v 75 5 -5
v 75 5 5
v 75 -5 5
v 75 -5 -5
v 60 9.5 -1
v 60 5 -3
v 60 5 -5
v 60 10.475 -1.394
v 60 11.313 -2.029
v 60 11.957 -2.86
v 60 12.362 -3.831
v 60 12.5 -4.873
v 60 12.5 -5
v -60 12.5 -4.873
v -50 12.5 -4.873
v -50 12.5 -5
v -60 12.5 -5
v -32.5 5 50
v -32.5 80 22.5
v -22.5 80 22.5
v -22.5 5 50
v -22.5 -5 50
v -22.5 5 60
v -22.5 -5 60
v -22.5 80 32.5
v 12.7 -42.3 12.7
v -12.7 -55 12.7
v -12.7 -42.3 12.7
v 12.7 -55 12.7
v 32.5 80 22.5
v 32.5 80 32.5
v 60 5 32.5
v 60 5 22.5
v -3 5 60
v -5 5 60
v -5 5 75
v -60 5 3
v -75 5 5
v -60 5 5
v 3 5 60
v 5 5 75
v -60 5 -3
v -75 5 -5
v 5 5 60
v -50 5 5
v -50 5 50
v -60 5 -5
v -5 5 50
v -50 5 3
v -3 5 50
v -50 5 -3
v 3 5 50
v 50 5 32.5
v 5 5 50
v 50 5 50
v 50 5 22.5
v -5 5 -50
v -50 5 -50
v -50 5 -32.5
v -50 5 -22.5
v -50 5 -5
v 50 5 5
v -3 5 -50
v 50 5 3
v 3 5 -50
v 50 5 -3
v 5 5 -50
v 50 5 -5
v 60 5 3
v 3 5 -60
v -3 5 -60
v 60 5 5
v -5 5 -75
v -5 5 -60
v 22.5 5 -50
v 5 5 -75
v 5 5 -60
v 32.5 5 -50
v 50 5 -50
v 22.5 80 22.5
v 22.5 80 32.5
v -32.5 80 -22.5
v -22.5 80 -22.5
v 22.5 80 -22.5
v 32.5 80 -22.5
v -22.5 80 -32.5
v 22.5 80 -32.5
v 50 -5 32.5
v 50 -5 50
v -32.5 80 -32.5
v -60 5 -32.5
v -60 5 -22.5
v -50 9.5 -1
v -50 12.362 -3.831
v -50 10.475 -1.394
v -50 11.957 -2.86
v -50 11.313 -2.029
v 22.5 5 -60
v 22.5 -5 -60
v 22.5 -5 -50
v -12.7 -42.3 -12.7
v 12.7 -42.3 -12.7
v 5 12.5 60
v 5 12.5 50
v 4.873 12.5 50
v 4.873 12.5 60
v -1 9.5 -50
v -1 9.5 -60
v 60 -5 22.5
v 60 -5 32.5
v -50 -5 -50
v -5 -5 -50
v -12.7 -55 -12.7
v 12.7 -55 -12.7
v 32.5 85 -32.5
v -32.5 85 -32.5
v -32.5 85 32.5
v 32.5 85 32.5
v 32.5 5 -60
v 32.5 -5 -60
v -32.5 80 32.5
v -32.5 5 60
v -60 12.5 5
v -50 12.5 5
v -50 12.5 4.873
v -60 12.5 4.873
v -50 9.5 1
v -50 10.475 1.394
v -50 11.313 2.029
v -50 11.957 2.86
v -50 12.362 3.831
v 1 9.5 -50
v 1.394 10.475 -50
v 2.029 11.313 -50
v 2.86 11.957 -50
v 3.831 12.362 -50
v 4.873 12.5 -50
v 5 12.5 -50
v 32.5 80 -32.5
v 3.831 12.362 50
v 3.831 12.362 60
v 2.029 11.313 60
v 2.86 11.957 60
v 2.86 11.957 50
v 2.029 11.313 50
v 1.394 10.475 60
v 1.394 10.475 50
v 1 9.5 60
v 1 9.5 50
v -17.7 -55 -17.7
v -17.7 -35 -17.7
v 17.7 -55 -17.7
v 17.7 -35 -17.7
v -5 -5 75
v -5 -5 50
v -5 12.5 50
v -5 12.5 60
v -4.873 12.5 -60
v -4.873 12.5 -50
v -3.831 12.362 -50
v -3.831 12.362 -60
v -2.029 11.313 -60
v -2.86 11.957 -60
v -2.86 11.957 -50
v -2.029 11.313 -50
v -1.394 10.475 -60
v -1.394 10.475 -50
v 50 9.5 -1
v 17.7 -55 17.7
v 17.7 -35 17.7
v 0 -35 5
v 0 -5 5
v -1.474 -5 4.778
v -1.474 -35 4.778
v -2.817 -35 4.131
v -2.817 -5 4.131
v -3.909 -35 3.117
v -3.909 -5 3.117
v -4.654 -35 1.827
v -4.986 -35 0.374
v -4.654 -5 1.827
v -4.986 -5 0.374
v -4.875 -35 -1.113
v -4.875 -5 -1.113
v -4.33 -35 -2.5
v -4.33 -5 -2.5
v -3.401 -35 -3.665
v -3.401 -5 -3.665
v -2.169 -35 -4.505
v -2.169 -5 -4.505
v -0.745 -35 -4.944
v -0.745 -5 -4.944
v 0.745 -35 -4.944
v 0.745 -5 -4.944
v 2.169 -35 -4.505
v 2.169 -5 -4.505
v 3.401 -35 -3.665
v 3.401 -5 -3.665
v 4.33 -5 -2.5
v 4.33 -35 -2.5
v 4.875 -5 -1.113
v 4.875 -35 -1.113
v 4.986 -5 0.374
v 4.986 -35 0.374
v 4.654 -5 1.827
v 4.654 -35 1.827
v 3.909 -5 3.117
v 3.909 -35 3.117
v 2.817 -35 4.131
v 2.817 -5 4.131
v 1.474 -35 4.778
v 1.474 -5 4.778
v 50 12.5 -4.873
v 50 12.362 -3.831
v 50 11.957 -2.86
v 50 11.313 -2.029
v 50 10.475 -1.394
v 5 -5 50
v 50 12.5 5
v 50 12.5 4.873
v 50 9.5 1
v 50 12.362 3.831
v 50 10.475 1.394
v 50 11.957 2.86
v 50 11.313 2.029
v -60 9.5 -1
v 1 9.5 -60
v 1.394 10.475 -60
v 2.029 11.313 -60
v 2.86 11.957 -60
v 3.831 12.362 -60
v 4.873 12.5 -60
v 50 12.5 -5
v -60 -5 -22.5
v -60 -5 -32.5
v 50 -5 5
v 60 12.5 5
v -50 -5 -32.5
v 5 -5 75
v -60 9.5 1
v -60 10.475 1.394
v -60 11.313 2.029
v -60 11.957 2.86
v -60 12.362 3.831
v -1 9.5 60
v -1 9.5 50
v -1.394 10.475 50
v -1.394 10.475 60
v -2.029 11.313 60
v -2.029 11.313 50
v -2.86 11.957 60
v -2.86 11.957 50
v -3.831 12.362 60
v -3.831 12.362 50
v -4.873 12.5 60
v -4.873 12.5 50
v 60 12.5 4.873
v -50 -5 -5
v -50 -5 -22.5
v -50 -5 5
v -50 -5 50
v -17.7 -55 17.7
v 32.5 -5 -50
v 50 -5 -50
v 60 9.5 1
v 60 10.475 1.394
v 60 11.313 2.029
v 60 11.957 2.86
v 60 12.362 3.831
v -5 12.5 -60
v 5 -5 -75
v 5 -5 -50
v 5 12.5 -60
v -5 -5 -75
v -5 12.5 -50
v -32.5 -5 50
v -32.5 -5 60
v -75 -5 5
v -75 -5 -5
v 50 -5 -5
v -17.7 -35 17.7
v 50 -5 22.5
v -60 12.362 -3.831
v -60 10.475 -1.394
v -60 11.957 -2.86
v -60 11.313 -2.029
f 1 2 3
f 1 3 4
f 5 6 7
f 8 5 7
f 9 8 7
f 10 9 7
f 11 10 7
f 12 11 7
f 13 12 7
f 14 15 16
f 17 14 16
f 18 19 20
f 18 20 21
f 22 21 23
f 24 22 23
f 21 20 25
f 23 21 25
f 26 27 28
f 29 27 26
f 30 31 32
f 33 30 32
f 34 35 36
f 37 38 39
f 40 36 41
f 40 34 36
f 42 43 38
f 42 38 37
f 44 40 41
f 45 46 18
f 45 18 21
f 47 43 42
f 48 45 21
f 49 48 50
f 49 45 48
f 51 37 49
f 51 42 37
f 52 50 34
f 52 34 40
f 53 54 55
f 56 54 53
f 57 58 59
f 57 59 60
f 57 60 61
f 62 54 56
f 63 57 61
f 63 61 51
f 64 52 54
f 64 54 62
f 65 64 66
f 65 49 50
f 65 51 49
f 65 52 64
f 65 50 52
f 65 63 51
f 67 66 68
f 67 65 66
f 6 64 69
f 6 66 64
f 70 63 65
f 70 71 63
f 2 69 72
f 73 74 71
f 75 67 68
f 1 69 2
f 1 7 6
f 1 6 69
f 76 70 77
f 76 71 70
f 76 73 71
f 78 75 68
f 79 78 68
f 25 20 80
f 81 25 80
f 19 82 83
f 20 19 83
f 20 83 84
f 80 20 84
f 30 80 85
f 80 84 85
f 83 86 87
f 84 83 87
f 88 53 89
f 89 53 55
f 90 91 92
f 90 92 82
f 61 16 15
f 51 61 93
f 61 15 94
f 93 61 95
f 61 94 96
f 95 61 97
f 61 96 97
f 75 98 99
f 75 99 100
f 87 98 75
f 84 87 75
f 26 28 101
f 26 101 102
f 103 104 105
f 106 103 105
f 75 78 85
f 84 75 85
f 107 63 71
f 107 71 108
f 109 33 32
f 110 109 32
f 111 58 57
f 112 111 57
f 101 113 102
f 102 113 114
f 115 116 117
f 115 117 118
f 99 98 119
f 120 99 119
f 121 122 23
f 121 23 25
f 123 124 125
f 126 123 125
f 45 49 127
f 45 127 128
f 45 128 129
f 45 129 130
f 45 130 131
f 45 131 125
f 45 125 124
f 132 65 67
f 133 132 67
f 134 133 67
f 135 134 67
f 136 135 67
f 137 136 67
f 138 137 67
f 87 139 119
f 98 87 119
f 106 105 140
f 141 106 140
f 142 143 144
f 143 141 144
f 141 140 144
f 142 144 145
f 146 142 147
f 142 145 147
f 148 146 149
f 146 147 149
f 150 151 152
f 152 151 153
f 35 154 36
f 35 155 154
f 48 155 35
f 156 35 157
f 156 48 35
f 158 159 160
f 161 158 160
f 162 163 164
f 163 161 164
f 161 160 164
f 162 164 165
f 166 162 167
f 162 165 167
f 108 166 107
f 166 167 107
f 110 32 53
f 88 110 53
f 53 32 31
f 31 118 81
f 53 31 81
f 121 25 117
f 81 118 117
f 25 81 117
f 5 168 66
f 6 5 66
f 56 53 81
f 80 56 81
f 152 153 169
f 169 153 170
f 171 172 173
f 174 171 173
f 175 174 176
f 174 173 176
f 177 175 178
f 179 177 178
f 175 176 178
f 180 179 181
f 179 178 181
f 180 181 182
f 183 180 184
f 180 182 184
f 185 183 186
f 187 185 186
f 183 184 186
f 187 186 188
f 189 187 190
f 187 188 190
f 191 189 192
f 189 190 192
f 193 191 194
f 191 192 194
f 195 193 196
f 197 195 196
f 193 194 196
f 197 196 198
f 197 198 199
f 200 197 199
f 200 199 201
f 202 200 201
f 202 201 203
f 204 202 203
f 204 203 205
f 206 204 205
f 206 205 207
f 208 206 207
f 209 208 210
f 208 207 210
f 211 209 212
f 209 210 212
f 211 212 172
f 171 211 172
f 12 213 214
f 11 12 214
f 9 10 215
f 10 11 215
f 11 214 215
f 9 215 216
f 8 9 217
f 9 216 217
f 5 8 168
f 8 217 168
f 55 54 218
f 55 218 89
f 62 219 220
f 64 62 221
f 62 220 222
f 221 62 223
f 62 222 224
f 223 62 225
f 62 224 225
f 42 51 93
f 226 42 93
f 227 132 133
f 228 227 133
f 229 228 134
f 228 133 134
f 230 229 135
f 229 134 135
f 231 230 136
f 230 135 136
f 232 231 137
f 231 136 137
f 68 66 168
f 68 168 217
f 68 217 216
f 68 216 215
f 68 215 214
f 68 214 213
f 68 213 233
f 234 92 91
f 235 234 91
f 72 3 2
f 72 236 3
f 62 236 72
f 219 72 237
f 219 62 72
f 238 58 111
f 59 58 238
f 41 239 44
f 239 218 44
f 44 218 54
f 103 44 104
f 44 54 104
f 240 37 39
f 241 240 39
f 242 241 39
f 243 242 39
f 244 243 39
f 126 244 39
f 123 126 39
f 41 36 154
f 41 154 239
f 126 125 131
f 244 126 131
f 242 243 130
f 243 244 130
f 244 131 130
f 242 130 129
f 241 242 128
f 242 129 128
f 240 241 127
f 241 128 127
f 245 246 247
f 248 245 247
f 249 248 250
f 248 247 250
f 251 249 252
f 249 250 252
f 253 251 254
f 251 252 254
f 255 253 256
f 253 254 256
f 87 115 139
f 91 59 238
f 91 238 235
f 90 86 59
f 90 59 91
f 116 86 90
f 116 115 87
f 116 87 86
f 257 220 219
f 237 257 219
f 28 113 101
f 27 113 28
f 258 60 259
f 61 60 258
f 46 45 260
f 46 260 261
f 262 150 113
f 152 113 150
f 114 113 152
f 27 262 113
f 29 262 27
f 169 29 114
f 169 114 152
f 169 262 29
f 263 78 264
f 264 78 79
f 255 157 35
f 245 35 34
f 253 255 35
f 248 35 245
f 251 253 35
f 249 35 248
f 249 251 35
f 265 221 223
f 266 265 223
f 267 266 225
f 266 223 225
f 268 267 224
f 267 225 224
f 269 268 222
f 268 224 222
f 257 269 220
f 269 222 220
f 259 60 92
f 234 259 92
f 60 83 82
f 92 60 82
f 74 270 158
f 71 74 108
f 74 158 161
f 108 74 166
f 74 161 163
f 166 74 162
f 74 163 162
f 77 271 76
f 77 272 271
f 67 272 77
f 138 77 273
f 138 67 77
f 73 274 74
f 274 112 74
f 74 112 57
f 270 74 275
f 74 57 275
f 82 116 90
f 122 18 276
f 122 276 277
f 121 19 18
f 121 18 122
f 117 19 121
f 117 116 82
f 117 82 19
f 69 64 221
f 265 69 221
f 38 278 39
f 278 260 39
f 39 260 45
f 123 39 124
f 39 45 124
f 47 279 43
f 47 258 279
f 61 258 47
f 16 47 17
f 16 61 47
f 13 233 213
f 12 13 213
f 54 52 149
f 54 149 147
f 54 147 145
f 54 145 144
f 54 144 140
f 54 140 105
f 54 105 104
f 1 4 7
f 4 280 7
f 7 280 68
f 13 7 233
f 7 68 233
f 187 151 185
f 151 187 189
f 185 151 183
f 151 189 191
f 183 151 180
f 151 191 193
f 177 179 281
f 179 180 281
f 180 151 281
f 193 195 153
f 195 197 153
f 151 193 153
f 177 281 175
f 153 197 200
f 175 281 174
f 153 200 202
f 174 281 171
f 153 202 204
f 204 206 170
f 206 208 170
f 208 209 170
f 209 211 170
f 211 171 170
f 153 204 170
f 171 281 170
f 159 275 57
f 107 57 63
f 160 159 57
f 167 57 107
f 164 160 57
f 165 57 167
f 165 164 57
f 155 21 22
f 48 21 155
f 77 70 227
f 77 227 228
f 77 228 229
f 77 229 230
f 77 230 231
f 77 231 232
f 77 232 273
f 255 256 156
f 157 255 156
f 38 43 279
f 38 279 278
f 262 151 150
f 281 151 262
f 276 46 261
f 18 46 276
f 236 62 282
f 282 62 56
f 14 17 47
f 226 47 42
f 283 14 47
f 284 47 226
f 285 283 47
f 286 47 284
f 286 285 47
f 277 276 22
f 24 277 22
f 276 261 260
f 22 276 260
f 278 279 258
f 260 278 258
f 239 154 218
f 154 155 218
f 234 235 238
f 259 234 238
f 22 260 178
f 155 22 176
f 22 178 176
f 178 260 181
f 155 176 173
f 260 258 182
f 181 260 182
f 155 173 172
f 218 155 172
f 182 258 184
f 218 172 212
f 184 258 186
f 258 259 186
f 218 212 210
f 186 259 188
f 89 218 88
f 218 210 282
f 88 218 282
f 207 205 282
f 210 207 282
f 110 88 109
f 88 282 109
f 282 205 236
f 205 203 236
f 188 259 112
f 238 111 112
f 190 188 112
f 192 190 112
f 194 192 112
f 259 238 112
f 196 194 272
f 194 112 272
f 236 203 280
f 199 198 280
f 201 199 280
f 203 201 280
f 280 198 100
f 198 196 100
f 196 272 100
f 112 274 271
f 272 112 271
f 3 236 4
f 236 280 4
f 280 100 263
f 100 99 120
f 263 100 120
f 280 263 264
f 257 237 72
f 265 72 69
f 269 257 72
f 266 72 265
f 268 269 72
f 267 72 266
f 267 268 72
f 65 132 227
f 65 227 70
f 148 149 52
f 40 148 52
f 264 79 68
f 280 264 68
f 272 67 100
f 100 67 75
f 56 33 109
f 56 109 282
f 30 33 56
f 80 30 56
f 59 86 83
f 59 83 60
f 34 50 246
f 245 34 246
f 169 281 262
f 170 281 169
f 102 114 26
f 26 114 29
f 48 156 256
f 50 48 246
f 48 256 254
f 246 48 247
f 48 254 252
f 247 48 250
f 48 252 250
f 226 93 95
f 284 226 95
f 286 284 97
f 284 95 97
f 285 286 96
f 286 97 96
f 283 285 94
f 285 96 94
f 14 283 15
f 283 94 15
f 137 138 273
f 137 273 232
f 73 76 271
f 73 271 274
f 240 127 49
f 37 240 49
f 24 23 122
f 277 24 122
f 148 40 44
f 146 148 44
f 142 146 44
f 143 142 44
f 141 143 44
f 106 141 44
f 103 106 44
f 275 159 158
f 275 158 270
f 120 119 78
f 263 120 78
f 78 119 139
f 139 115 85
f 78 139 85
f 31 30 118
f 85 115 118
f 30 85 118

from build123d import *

# Parameters (mm, degrees)
SKETCH2_W            = 100
SKETCH2_H            = 100
BOSS_EXTRUDE1_DEPTH  = 5
SKETCH3_W            = 100
SKETCH3_H            = 100
BOSS_EXTRUDE2_DEPTH  = 5
SKETCH8_R            = 5
BOSS_EXTRUDE7_DEPTH  = 30
SKETCH9_W            = 35.4
SKETCH9_H            = 35.4
BOSS_EXTRUDE8_DEPTH  = 20
SKETCH10_W           = 25.4
SKETCH10_H           = 25.4
CUT_EXTRUDE1_DEPTH   = 12.7
BOSS_EXTRUDE21_DEPTH = 10
FILLET14_R           = 4
FILLET13_R           = 4
SKETCH24_W           = 10
SKETCH24_H           = 10
BOSS_EXTRUDE22_DEPTH = 15
BOSS_EXTRUDE25_DEPTH = 10
SKETCH26_W           = 10
SKETCH26_H           = 10
BOSS_EXTRUDE26_DEPTH = 15
FILLET18_R           = 4
FILLET17_R           = 4
BOSS_EXTRUDE23_DEPTH = 10
SKETCH25_W           = 10
SKETCH25_H           = 10
BOSS_EXTRUDE24_DEPTH = 15
FILLET15_R           = 4
FILLET16_R           = 4
BOSS_EXTRUDE10_DEPTH = 10
FILLET19_R           = 4
SKETCH27_W           = 10
SKETCH27_H           = 10
BOSS_EXTRUDE27_DEPTH = 15
FILLET20_R           = 4
SKETCH33_W           = 65
SKETCH33_H           = 65
BOSS_EXTRUDE29_DEPTH = 5
BOSS_EXTRUDE28_DEPTH = 10
BOSS_EXTRUDE32_DEPTH = 10
BOSS_EXTRUDE31_DEPTH = 10
BOSS_EXTRUDE33_DEPTH = 10
BOSS_EXTRUDE34_DEPTH = 10
BOSS_EXTRUDE35_DEPTH = 10
BOSS_EXTRUDE36_DEPTH = 10
BOSS_EXTRUDE37_DEPTH = 10


with BuildPart() as part:
    # Sketch2 → Boss-Extrude1 (new body)
    with BuildSketch(Plane(origin=(0, 0, 0), x_dir=(1, 0, 0), z_dir=(0, 1, 0))):
        Rectangle(SKETCH2_W, SKETCH2_H)
    extrude(amount=BOSS_EXTRUDE1_DEPTH)

    # Sketch3 → Boss-Extrude2 (add)
    with BuildSketch(Plane.XZ):
        Rectangle(SKETCH3_W, SKETCH3_H)
    extrude(amount=BOSS_EXTRUDE2_DEPTH)

    # Sketch8 → Boss-Extrude7 (add)
    with BuildSketch(Plane.XZ.offset(5)):
        with Locations(Location((0, 0, 0), (0, 0, 90))):
            Circle(SKETCH8_R)
    extrude(amount=BOSS_EXTRUDE7_DEPTH)

    # Sketch9 → Boss-Extrude8 (add)
    with BuildSketch(Plane.XZ.offset(35)):
        Rectangle(SKETCH9_W, SKETCH9_H)
    extrude(amount=BOSS_EXTRUDE8_DEPTH)

    # Sketch10 → Cut-Extrude1 (cut)
    with BuildSketch(Plane.XZ.offset(55)):
        Rectangle(SKETCH10_W, SKETCH10_H)
    extrude(amount=-CUT_EXTRUDE1_DEPTH, mode=Mode.SUBTRACT)

    # Sketch11 → Boss-Extrude21 (add)
    with BuildSketch(Plane(origin=(50, 0, 0), x_dir=(0, 0, -1), z_dir=(1, 0, 0))):
        Polygon((5, -5), (5, 12.5), (1, 12.5), (1, 9.5), (3, 5), (-3, 5), (-1, 9.5), (-1, 12.5), (-5, 12.5), (-5, -5), align=None)
    extrude(amount=BOSS_EXTRUDE21_DEPTH)

    # Fillet14
    # the kernel refuses this fillet: 4 mm, written as the material it takes off along each edge
    with BuildSketch(Plane(origin=(40.317541634, 12.5, -1), x_dir=(0, 0, -1), z_dir=(1, 0, 0))) as fillet14_piece_1:
        with BuildLine():
            CenterArc((3.872983346, -4), FILLET14_R, 90, 75.522487814)
            Line((0, -3), (-0.077459667, -2.98))
            ThreePointArc((-0.077459667, -2.98), (-0.08, -1.5), (-0.08, 0))
            Line((-0.08, 0), (0, 0.08))
            Line((0, 0.08), (3.872983346, 0.08))
            Line((3.872983346, 0.08), (3.872983346, 0))
        make_face()
    extrude(amount=29.364916731, mode=Mode.SUBTRACT)

    # Fillet13
    # the kernel refuses this fillet: 4 mm, written as the material it takes off along each edge
    with BuildSketch(Plane(origin=(40.317541634, 12.5, 1), x_dir=(0, 0, 1), z_dir=(1, 0, 0))) as fillet13_piece_1:
        with BuildLine():
            CenterArc((3.872983346, 4), FILLET13_R, 194.477512186, 75.522487814)
            Line((0, 3), (-0.077459667, 2.98))
            ThreePointArc((-0.077459667, 2.98), (-0.08, 1.5), (-0.08, 0))
            Line((-0.08, 0), (0, -0.08))
            Line((0, -0.08), (3.872983346, -0.08))
            Line((3.872983346, -0.08), (3.872983346, 0))
        make_face()
    extrude(amount=29.364916731, mode=Mode.SUBTRACT)

    # Sketch24 → Boss-Extrude22 (add)
    with BuildSketch(Plane(origin=(60, 0, 0), x_dir=(0, 0, -1), z_dir=(1, 0, 0))):
        Rectangle(SKETCH24_W, SKETCH24_H)
    extrude(amount=BOSS_EXTRUDE22_DEPTH)

    # Sketch13 → Boss-Extrude25 (add)
    with BuildSketch(Plane.ZY.offset(50)):
        Polygon((-5, 12.5), (-5, -5), (5, -5), (5, 12.5), (1, 12.5), (1, 9.5), (3, 5), (-3, 5), (-1, 9.5), (-1, 12.5), align=None)
    extrude(amount=BOSS_EXTRUDE25_DEPTH)

    # Sketch26 → Boss-Extrude26 (add)
    with BuildSketch(Plane.ZY.offset(60)):
        Rectangle(SKETCH26_W, SKETCH26_H)
    extrude(amount=BOSS_EXTRUDE26_DEPTH)

    # Fillet18
    # the kernel refuses this fillet: 4 mm, written as the material it takes off along each edge
    with BuildSketch(Plane(origin=(-40.317541634, 12.5, 1), x_dir=(0, 0, 1), z_dir=(-1, 0, 0))) as fillet18_piece_1:
        with BuildLine():
            CenterArc((3.872983346, -4), FILLET18_R, 90, 75.522487814)
            Line((0, -3), (-0.077459667, -2.98))
            ThreePointArc((-0.077459667, -2.98), (-0.08, -1.5), (-0.08, 0))
            Line((-0.08, 0), (0, 0.08))
            Line((0, 0.08), (3.872983346, 0.08))
            Line((3.872983346, 0.08), (3.872983346, 0))
        make_face()
    extrude(amount=29.364916731, mode=Mode.SUBTRACT)

    # Fillet17
    # the kernel refuses this fillet: 4 mm, written as the material it takes off along each edge
    with BuildSketch(Plane(origin=(-40.317541634, 12.5, -1), x_dir=(0, 0, -1), z_dir=(-1, 0, 0))) as fillet17_piece_1:
        with BuildLine():
            CenterArc((3.872983346, 4), FILLET17_R, 194.477512186, 75.522487814)
            Line((0, 3), (-0.077459667, 2.98))
            ThreePointArc((-0.077459667, 2.98), (-0.08, 1.5), (-0.08, 0))
            Line((-0.08, 0), (0, -0.08))
            Line((0, -0.08), (3.872983346, -0.08))
            Line((3.872983346, -0.08), (3.872983346, 0))
        make_face()
    extrude(amount=29.364916731, mode=Mode.SUBTRACT)

    # Sketch14 → Boss-Extrude23 (add)
    with BuildSketch(Plane(origin=(0, 0, -50), x_dir=(-1, 0, 0), z_dir=(0, 0, -1))):
        Polygon((-5, 12.5), (-1, 12.5), (-1, 9.5), (-3, 5), (3, 5), (1, 9.5), (1, 12.5), (5, 12.5), (5, -5), (-5, -5), align=None)
    extrude(amount=BOSS_EXTRUDE23_DEPTH)

    # Sketch25 → Boss-Extrude24 (add)
    with BuildSketch(Plane(origin=(0, 0, -60), x_dir=(-1, 0, 0), z_dir=(0, 0, -1))):
        Rectangle(SKETCH25_W, SKETCH25_H)
    extrude(amount=BOSS_EXTRUDE24_DEPTH)

    # Fillet15
    # the kernel refuses this fillet: 4 mm, written as the material it takes off along each edge
    with BuildSketch(Plane(origin=(-1, 12.5, -40.317541634), x_dir=(0, -1, 0), z_dir=(0, 0, -1))) as fillet15_piece_1:
        with BuildLine():
            CenterArc((4, 3.872983346), FILLET15_R, 180, 75.522487814)
            Line((0, 3.872983346), (-0.08, 3.872983346))
            Line((-0.08, 3.872983346), (-0.08, 0))
            Line((-0.08, 0), (0, -0.08))
            ThreePointArc((0, -0.08), (1.5, -0.08), (2.98, -0.077459667))
            Line((2.98, -0.077459667), (3, 0))
        make_face()
    extrude(amount=29.364916731, mode=Mode.SUBTRACT)

    # Fillet16
    # the kernel refuses this fillet: 4 mm, written as the material it takes off along each edge
    with BuildSketch(Plane(origin=(1, 12.5, -40.317541634), x_dir=(1, 0, 0), z_dir=(0, 0, -1))) as fillet16_piece_1:
        with BuildLine():
            CenterArc((3.872983346, 4), FILLET16_R, 194.477512186, 75.522487814)
            Line((0, 3), (-0.077459667, 2.98))
            ThreePointArc((-0.077459667, 2.98), (-0.08, 1.5), (-0.08, 0))
            Line((-0.08, 0), (0, -0.08))
            Line((0, -0.08), (3.872983346, -0.08))
            Line((3.872983346, -0.08), (3.872983346, 0))
        make_face()
    extrude(amount=29.364916731, mode=Mode.SUBTRACT)

    # Sketch12 → Boss-Extrude10 (add)
    with BuildSketch(Plane.XY.offset(50)):
        Polygon((-5, 12.5), (-5, -5), (5, -5), (5, 12.5), (1, 12.5), (1, 9.5), (3, 5), (-3, 5), (-1, 9.5), (-1, 12.5), align=None)
    extrude(amount=BOSS_EXTRUDE10_DEPTH)

    # Fillet19
    # the kernel refuses this fillet: 4 mm, written as the material it takes off along each edge
    with BuildSketch(Plane(origin=(-1, 12.5, 40.317541634), x_dir=(-1, 0, 0), z_dir=(0, 0, 1))) as fillet19_piece_1:
        with BuildLine():
            CenterArc((3.872983346, 4), FILLET19_R, 194.477512186, 75.522487814)
            Line((0, 3), (-0.077459667, 2.98))
            ThreePointArc((-0.077459667, 2.98), (-0.08, 1.5), (-0.08, 0))
            Line((-0.08, 0), (0, -0.08))
            Line((0, -0.08), (3.872983346, -0.08))
            Line((3.872983346, -0.08), (3.872983346, 0))
        make_face()
    extrude(amount=29.364916731, mode=Mode.SUBTRACT)

    # Sketch27 → Boss-Extrude27 (add)
    with BuildSketch(Plane.XY.offset(60)):
        Rectangle(SKETCH27_W, SKETCH27_H)
    extrude(amount=BOSS_EXTRUDE27_DEPTH)

    # Fillet20
    # the kernel refuses this fillet: 4 mm, written as the material it takes off along each edge
    with BuildSketch(Plane(origin=(1, 12.5, 40.317541634), x_dir=(1, 0, 0), z_dir=(0, 0, 1))) as fillet20_piece_1:
        with BuildLine():
            CenterArc((3.872983346, -4), FILLET20_R, 90, 75.522487814)
            Line((0, -3), (-0.077459667, -2.98))
            ThreePointArc((-0.077459667, -2.98), (-0.08, -1.5), (-0.08, 0))
            Line((-0.08, 0), (0, 0.08))
            Line((0, 0.08), (3.872983346, 0.08))
            Line((3.872983346, 0.08), (3.872983346, 0))
        make_face()
    extrude(amount=29.364916731, mode=Mode.SUBTRACT)

    # Sketch30 → Boss-Extrude28 (add)
    with BuildSketch(Plane.ZY.offset(50)):
        Polygon((-27.5, 5), (-22.5, 5), (-22.5, -5), (-32.5, -5), (-32.5, 5), align=None)
    extrude(amount=BOSS_EXTRUDE28_DEPTH)



with BuildPart() as body_2:
    # Sketch33 → Boss-Extrude29 (new body)
    with BuildSketch(Plane(origin=(0, 85, 0), x_dir=(1, 0, 0), z_dir=(0, 1, 0))):
        Rectangle(SKETCH33_W, SKETCH33_H)
    extrude(amount=-BOSS_EXTRUDE29_DEPTH)


with BuildPart() as part_1:
    add(part.part)

    add(body_2.part)  # Boss-Extrude32 merges body 2
    # Sketch40 → Boss-Extrude32 (add)
    with BuildSketch(Plane(origin=(0, 0, -32.5), x_dir=(-1, 0, 0), z_dir=(0, 0, -1))):
        Polygon((60, 5), (32.5, 80), (22.5, 80), (50, 5), align=None)
    extrude(amount=-BOSS_EXTRUDE32_DEPTH)

    # Sketch37 → Boss-Extrude31 (add)
    with BuildSketch(Plane.XY.offset(50)):
        Polygon((-27.5, 5), (-22.5, 5), (-22.5, -5), (-32.5, -5), (-32.5, 5), align=None)
    extrude(amount=BOSS_EXTRUDE31_DEPTH)

    # Sketch41 → Boss-Extrude33 (add)
    with BuildSketch(Plane.ZY.offset(32.5)):
        Polygon((60, 5), (32.5, 80), (22.5, 80), (50, 5), align=None)
    extrude(amount=-BOSS_EXTRUDE33_DEPTH)

    # Sketch42 → Boss-Extrude34 (add)
    with BuildSketch(Plane(origin=(50, 0, 0), x_dir=(0, 0, -1), z_dir=(1, 0, 0))):
        Polygon((-27.5, 5), (-22.5, 5), (-22.5, -5), (-32.5, -5), (-32.5, 5), align=None)
    extrude(amount=BOSS_EXTRUDE34_DEPTH)

    # Sketch43 → Boss-Extrude35 (add)
    with BuildSketch(Plane.XY.offset(32.5)):
        Polygon((32.5, 80), (60, 5), (50, 5), (22.5, 80), align=None)
    extrude(amount=-BOSS_EXTRUDE35_DEPTH)

    # Sketch44 → Boss-Extrude36 (add)
    with BuildSketch(Plane(origin=(0, 0, -50), x_dir=(-1, 0, 0), z_dir=(0, 0, -1))):
        Polygon((-27.5, 5), (-22.5, 5), (-22.5, -5), (-32.5, -5), (-32.5, 5), align=None)
    extrude(amount=BOSS_EXTRUDE36_DEPTH)

    # Sketch45 → Boss-Extrude37 (add)
    with BuildSketch(Plane(origin=(32.5, 0, 0), x_dir=(0, 0, -1), z_dir=(1, 0, 0))):
        Polygon((32.5, 80), (60, 5), (50, 5), (22.5, 80), align=None)
    extrude(amount=-BOSS_EXTRUDE37_DEPTH)


solid = part_1.part
